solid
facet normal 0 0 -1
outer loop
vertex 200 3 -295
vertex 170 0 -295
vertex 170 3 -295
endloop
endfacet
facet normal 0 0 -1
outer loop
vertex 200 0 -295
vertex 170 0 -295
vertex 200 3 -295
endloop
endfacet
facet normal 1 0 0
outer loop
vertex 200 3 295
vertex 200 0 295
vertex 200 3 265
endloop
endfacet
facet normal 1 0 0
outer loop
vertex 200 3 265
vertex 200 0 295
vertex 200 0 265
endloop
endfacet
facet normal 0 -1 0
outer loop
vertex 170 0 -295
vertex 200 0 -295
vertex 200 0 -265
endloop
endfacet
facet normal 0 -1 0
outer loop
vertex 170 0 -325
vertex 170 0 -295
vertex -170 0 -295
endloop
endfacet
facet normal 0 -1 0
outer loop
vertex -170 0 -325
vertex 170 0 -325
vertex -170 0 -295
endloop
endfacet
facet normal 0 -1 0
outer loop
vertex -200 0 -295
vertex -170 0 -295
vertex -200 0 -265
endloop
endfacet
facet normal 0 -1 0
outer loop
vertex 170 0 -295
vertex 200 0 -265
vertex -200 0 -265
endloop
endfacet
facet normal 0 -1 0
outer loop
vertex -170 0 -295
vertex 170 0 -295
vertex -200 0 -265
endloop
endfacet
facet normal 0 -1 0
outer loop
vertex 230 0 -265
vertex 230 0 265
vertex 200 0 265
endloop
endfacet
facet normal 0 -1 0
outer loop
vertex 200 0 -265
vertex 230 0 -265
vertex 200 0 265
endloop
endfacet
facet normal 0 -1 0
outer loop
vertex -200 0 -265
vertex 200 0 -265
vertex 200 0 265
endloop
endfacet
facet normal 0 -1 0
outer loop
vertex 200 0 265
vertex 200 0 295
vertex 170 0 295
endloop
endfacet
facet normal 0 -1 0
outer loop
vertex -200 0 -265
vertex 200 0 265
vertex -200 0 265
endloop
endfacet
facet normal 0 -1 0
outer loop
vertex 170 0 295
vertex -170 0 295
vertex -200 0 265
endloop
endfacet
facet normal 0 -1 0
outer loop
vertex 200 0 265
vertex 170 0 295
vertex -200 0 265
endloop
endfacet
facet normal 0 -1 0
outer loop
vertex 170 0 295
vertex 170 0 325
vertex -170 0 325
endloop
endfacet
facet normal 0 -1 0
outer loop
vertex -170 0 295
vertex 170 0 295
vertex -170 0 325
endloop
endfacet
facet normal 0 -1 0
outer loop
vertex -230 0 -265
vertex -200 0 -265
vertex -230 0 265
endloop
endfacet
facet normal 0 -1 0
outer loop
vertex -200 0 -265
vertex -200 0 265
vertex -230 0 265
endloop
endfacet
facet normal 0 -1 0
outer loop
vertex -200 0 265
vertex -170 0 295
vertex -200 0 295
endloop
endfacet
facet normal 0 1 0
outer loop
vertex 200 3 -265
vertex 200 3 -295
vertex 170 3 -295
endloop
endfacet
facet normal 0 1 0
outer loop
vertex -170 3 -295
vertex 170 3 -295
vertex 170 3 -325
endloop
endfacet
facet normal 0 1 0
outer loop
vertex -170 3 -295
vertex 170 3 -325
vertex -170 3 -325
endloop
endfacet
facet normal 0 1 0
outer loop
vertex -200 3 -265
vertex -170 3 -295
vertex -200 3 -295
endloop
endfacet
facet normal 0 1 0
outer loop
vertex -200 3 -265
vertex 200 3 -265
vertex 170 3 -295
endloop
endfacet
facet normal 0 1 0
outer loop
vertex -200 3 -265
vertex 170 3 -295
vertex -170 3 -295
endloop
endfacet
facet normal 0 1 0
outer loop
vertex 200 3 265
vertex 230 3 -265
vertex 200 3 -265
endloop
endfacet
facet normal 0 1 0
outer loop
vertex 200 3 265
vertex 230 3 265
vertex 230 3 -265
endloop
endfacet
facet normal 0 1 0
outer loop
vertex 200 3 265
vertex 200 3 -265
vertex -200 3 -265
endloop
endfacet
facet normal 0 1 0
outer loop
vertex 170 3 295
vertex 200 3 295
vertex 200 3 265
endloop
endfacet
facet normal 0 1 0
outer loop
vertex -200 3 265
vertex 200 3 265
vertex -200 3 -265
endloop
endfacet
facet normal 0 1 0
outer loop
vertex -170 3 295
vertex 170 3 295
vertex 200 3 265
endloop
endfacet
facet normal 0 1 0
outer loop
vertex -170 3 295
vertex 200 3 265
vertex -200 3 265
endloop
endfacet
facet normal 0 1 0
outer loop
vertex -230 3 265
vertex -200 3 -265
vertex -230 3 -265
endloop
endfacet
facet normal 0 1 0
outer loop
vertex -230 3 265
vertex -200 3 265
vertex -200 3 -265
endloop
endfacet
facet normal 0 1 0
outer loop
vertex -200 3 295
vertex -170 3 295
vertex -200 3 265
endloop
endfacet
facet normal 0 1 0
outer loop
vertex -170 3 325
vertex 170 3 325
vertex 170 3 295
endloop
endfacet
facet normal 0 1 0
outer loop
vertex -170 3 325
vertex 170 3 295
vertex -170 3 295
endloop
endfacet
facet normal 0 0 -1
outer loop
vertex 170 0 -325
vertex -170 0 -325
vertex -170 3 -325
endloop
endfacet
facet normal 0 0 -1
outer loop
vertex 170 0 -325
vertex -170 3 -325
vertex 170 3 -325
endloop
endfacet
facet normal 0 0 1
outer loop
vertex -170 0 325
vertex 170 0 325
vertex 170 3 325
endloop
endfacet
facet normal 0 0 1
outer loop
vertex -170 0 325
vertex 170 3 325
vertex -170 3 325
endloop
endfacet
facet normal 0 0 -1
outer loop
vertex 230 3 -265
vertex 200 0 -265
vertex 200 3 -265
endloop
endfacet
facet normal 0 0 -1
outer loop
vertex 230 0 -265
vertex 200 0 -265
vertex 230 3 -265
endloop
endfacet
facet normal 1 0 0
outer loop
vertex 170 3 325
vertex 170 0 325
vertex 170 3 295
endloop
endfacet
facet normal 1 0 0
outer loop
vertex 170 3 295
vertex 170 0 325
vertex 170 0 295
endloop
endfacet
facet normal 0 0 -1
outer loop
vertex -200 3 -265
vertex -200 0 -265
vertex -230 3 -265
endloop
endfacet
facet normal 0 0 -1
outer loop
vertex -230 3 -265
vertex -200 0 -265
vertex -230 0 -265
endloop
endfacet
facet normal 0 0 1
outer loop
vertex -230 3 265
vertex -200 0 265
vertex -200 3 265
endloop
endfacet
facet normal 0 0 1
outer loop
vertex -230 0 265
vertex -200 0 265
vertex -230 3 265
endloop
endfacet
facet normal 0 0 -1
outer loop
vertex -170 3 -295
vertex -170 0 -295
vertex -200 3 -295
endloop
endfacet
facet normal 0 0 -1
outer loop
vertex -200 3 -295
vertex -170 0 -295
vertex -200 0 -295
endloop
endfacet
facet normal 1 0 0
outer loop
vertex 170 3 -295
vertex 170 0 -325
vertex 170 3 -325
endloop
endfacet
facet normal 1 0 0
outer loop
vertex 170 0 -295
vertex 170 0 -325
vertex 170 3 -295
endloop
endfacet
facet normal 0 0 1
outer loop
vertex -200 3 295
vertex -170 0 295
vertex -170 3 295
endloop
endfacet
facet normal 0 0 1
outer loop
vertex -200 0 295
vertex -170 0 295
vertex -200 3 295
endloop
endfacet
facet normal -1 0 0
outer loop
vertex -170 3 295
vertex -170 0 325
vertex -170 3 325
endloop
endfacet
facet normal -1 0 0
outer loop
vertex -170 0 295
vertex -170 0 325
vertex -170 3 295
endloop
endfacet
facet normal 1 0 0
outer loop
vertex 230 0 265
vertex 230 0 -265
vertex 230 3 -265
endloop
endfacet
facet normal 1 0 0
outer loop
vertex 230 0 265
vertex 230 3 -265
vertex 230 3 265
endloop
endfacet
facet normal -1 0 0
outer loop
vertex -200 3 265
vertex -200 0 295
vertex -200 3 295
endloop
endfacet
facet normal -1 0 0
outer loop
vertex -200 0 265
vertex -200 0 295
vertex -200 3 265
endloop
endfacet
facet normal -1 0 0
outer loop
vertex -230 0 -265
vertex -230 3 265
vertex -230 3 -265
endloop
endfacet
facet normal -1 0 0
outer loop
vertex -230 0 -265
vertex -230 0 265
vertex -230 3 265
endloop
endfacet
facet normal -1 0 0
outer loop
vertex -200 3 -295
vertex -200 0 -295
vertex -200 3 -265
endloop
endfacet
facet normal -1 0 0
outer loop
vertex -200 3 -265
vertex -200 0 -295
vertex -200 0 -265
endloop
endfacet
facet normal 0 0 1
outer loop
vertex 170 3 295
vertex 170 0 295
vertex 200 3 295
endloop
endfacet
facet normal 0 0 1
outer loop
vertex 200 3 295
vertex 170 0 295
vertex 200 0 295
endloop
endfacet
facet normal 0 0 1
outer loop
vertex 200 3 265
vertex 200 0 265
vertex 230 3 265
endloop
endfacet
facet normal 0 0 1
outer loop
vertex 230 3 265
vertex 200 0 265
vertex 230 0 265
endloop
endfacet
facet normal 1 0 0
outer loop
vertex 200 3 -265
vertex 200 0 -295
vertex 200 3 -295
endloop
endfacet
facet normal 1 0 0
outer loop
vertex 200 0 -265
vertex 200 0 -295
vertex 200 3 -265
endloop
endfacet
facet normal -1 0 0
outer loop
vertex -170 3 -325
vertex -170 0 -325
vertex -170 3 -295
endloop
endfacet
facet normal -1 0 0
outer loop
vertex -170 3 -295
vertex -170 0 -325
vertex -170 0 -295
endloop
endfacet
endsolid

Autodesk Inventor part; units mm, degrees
sketch "Эскиз1" plane through (0, 0, 0) normal (0, 1, 0) x (-1, 0, 0)
  line L0 (230, -325) -> (-230, -325)
  line L1 (-230, -325) -> (-230, 325)
  line L2 (-230, 325) -> (230, 325)
  line L3 (230, 325) -> (230, -325)
  line L4 (230, -325) -> (-230, 325) construction
  line L5 (-230, -325) -> (230, 325) construction
  line L6 (-230, -325) -> (-170, -325)
  line L7 (-170, -325) -> (-170, -295)
  line L8 (-170, -295) -> (-230, -295)
  line L9 (-230, -295) -> (-230, -325)
  line L10 (-230, -325) -> (-200, -325)
  line L11 (-200, -325) -> (-200, -265)
  line L12 (-200, -265) -> (-230, -265)
  line L13 (-230, -265) -> (-230, -325)
  line L14 (-230, 0) -> (230, 0) construction
  line L15 (0, -325) -> (0, 325) construction
  line L16 (-230, 325) -> (-170, 325)
  line L17 (-170, 325) -> (-170, 295)
  line L18 (-170, 295) -> (-230, 295)
  line L19 (-230, 295) -> (-230, 325)
  line L20 (-230, 325) -> (-200, 325)
  line L21 (-200, 325) -> (-200, 265)
  line L22 (-200, 265) -> (-230, 265)
  line L23 (-230, 265) -> (-230, 325)
  line L24 (230, -325) -> (170, -325)
  line L25 (170, -325) -> (170, -295)
  line L26 (170, -295) -> (230, -295)
  line L27 (230, -295) -> (230, -325)
  line L28 (230, -325) -> (200, -325)
  line L29 (200, -325) -> (200, -265)
  line L30 (200, -265) -> (230, -265)
  line L31 (230, -265) -> (230, -325)
  line L32 (170, 295) -> (230, 295)
  line L33 (230, 325) -> (170, 325)
  line L34 (170, 325) -> (170, 295)
  line L35 (230, 295) -> (230, 325)
  line L36 (230, 325) -> (200, 325)
  line L37 (200, 325) -> (200, 265)
  line L38 (230, 265) -> (230, 325)
  line L39 (200, 265) -> (230, 265)
  point P0 (0, 0)
  point P1 (200, 295)
  point P2 (-200, 295)
  point P3 (-200, -295)
  point P4 (200, -295)
  dimension "d0" = 650
  dimension "d1" = 460
  dimension "d2" = 30
  dimension "d3" = 60
extrude "Выдавливание1" add sketch "Эскиз1" along normal blind 3 contours L0 L7 L8 L11 L12 L1 L22 L21 L18 L17 L2 L34 L32 L37 L39 L3 L30 L29 L26 L25
properties part number "Фанера платформы"
